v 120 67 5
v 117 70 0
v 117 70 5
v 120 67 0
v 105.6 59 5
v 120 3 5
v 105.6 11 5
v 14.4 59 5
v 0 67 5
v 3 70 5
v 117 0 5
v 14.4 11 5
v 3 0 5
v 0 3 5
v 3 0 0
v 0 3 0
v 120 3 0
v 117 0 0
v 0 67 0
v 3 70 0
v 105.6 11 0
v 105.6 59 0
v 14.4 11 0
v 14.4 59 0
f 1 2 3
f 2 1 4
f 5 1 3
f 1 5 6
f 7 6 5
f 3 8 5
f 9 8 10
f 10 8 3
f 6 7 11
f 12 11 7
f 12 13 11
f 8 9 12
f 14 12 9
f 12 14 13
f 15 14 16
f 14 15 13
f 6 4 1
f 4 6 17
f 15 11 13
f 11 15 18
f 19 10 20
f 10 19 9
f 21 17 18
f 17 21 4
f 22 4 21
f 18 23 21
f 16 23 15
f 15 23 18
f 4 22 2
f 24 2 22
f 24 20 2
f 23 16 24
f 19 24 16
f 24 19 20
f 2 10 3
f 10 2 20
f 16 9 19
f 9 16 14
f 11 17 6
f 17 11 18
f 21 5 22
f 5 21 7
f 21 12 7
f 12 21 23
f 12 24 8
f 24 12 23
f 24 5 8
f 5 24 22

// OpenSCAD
$fn = 32;

// ----------------------------------------------------------------------
// Windowed plate: 1 voids, 120 x 70 x 5 mm
// ----------------------------------------------------------------------

// --- parameters (mm) ---
plate_l = 120;            // plate length, X
plate_w = 70;             // plate width, Y
plate_t = 5;              // plate thickness, Z
edge_margin = 8;          // wall from the plate edge to any window
win1_l = 91.2;            // window length
win1_w = 48;              // window width
depth_1 = 5;              // depth of void 1 (full thickness = through)
corner_c = 3;             // corner chamfer of the plate

profile = [[3, 0], [117, 0], [120, 3], [120, 67], [117, 70], [3, 70], [0, 67], [0, 3]];  // primary outline, 8 points, counter clockwise
void_1 = [[14.4, 11], [105.6, 11], [105.6, 59], [14.4, 59]];  // large central window, 4 points

// --- the one profile operation ---
difference() {
  linear_extrude(height = plate_t) polygon(points = profile);
  translate([0, 0, -1])
    linear_extrude(height = plate_t + 2) polygon(points = void_1);
}
